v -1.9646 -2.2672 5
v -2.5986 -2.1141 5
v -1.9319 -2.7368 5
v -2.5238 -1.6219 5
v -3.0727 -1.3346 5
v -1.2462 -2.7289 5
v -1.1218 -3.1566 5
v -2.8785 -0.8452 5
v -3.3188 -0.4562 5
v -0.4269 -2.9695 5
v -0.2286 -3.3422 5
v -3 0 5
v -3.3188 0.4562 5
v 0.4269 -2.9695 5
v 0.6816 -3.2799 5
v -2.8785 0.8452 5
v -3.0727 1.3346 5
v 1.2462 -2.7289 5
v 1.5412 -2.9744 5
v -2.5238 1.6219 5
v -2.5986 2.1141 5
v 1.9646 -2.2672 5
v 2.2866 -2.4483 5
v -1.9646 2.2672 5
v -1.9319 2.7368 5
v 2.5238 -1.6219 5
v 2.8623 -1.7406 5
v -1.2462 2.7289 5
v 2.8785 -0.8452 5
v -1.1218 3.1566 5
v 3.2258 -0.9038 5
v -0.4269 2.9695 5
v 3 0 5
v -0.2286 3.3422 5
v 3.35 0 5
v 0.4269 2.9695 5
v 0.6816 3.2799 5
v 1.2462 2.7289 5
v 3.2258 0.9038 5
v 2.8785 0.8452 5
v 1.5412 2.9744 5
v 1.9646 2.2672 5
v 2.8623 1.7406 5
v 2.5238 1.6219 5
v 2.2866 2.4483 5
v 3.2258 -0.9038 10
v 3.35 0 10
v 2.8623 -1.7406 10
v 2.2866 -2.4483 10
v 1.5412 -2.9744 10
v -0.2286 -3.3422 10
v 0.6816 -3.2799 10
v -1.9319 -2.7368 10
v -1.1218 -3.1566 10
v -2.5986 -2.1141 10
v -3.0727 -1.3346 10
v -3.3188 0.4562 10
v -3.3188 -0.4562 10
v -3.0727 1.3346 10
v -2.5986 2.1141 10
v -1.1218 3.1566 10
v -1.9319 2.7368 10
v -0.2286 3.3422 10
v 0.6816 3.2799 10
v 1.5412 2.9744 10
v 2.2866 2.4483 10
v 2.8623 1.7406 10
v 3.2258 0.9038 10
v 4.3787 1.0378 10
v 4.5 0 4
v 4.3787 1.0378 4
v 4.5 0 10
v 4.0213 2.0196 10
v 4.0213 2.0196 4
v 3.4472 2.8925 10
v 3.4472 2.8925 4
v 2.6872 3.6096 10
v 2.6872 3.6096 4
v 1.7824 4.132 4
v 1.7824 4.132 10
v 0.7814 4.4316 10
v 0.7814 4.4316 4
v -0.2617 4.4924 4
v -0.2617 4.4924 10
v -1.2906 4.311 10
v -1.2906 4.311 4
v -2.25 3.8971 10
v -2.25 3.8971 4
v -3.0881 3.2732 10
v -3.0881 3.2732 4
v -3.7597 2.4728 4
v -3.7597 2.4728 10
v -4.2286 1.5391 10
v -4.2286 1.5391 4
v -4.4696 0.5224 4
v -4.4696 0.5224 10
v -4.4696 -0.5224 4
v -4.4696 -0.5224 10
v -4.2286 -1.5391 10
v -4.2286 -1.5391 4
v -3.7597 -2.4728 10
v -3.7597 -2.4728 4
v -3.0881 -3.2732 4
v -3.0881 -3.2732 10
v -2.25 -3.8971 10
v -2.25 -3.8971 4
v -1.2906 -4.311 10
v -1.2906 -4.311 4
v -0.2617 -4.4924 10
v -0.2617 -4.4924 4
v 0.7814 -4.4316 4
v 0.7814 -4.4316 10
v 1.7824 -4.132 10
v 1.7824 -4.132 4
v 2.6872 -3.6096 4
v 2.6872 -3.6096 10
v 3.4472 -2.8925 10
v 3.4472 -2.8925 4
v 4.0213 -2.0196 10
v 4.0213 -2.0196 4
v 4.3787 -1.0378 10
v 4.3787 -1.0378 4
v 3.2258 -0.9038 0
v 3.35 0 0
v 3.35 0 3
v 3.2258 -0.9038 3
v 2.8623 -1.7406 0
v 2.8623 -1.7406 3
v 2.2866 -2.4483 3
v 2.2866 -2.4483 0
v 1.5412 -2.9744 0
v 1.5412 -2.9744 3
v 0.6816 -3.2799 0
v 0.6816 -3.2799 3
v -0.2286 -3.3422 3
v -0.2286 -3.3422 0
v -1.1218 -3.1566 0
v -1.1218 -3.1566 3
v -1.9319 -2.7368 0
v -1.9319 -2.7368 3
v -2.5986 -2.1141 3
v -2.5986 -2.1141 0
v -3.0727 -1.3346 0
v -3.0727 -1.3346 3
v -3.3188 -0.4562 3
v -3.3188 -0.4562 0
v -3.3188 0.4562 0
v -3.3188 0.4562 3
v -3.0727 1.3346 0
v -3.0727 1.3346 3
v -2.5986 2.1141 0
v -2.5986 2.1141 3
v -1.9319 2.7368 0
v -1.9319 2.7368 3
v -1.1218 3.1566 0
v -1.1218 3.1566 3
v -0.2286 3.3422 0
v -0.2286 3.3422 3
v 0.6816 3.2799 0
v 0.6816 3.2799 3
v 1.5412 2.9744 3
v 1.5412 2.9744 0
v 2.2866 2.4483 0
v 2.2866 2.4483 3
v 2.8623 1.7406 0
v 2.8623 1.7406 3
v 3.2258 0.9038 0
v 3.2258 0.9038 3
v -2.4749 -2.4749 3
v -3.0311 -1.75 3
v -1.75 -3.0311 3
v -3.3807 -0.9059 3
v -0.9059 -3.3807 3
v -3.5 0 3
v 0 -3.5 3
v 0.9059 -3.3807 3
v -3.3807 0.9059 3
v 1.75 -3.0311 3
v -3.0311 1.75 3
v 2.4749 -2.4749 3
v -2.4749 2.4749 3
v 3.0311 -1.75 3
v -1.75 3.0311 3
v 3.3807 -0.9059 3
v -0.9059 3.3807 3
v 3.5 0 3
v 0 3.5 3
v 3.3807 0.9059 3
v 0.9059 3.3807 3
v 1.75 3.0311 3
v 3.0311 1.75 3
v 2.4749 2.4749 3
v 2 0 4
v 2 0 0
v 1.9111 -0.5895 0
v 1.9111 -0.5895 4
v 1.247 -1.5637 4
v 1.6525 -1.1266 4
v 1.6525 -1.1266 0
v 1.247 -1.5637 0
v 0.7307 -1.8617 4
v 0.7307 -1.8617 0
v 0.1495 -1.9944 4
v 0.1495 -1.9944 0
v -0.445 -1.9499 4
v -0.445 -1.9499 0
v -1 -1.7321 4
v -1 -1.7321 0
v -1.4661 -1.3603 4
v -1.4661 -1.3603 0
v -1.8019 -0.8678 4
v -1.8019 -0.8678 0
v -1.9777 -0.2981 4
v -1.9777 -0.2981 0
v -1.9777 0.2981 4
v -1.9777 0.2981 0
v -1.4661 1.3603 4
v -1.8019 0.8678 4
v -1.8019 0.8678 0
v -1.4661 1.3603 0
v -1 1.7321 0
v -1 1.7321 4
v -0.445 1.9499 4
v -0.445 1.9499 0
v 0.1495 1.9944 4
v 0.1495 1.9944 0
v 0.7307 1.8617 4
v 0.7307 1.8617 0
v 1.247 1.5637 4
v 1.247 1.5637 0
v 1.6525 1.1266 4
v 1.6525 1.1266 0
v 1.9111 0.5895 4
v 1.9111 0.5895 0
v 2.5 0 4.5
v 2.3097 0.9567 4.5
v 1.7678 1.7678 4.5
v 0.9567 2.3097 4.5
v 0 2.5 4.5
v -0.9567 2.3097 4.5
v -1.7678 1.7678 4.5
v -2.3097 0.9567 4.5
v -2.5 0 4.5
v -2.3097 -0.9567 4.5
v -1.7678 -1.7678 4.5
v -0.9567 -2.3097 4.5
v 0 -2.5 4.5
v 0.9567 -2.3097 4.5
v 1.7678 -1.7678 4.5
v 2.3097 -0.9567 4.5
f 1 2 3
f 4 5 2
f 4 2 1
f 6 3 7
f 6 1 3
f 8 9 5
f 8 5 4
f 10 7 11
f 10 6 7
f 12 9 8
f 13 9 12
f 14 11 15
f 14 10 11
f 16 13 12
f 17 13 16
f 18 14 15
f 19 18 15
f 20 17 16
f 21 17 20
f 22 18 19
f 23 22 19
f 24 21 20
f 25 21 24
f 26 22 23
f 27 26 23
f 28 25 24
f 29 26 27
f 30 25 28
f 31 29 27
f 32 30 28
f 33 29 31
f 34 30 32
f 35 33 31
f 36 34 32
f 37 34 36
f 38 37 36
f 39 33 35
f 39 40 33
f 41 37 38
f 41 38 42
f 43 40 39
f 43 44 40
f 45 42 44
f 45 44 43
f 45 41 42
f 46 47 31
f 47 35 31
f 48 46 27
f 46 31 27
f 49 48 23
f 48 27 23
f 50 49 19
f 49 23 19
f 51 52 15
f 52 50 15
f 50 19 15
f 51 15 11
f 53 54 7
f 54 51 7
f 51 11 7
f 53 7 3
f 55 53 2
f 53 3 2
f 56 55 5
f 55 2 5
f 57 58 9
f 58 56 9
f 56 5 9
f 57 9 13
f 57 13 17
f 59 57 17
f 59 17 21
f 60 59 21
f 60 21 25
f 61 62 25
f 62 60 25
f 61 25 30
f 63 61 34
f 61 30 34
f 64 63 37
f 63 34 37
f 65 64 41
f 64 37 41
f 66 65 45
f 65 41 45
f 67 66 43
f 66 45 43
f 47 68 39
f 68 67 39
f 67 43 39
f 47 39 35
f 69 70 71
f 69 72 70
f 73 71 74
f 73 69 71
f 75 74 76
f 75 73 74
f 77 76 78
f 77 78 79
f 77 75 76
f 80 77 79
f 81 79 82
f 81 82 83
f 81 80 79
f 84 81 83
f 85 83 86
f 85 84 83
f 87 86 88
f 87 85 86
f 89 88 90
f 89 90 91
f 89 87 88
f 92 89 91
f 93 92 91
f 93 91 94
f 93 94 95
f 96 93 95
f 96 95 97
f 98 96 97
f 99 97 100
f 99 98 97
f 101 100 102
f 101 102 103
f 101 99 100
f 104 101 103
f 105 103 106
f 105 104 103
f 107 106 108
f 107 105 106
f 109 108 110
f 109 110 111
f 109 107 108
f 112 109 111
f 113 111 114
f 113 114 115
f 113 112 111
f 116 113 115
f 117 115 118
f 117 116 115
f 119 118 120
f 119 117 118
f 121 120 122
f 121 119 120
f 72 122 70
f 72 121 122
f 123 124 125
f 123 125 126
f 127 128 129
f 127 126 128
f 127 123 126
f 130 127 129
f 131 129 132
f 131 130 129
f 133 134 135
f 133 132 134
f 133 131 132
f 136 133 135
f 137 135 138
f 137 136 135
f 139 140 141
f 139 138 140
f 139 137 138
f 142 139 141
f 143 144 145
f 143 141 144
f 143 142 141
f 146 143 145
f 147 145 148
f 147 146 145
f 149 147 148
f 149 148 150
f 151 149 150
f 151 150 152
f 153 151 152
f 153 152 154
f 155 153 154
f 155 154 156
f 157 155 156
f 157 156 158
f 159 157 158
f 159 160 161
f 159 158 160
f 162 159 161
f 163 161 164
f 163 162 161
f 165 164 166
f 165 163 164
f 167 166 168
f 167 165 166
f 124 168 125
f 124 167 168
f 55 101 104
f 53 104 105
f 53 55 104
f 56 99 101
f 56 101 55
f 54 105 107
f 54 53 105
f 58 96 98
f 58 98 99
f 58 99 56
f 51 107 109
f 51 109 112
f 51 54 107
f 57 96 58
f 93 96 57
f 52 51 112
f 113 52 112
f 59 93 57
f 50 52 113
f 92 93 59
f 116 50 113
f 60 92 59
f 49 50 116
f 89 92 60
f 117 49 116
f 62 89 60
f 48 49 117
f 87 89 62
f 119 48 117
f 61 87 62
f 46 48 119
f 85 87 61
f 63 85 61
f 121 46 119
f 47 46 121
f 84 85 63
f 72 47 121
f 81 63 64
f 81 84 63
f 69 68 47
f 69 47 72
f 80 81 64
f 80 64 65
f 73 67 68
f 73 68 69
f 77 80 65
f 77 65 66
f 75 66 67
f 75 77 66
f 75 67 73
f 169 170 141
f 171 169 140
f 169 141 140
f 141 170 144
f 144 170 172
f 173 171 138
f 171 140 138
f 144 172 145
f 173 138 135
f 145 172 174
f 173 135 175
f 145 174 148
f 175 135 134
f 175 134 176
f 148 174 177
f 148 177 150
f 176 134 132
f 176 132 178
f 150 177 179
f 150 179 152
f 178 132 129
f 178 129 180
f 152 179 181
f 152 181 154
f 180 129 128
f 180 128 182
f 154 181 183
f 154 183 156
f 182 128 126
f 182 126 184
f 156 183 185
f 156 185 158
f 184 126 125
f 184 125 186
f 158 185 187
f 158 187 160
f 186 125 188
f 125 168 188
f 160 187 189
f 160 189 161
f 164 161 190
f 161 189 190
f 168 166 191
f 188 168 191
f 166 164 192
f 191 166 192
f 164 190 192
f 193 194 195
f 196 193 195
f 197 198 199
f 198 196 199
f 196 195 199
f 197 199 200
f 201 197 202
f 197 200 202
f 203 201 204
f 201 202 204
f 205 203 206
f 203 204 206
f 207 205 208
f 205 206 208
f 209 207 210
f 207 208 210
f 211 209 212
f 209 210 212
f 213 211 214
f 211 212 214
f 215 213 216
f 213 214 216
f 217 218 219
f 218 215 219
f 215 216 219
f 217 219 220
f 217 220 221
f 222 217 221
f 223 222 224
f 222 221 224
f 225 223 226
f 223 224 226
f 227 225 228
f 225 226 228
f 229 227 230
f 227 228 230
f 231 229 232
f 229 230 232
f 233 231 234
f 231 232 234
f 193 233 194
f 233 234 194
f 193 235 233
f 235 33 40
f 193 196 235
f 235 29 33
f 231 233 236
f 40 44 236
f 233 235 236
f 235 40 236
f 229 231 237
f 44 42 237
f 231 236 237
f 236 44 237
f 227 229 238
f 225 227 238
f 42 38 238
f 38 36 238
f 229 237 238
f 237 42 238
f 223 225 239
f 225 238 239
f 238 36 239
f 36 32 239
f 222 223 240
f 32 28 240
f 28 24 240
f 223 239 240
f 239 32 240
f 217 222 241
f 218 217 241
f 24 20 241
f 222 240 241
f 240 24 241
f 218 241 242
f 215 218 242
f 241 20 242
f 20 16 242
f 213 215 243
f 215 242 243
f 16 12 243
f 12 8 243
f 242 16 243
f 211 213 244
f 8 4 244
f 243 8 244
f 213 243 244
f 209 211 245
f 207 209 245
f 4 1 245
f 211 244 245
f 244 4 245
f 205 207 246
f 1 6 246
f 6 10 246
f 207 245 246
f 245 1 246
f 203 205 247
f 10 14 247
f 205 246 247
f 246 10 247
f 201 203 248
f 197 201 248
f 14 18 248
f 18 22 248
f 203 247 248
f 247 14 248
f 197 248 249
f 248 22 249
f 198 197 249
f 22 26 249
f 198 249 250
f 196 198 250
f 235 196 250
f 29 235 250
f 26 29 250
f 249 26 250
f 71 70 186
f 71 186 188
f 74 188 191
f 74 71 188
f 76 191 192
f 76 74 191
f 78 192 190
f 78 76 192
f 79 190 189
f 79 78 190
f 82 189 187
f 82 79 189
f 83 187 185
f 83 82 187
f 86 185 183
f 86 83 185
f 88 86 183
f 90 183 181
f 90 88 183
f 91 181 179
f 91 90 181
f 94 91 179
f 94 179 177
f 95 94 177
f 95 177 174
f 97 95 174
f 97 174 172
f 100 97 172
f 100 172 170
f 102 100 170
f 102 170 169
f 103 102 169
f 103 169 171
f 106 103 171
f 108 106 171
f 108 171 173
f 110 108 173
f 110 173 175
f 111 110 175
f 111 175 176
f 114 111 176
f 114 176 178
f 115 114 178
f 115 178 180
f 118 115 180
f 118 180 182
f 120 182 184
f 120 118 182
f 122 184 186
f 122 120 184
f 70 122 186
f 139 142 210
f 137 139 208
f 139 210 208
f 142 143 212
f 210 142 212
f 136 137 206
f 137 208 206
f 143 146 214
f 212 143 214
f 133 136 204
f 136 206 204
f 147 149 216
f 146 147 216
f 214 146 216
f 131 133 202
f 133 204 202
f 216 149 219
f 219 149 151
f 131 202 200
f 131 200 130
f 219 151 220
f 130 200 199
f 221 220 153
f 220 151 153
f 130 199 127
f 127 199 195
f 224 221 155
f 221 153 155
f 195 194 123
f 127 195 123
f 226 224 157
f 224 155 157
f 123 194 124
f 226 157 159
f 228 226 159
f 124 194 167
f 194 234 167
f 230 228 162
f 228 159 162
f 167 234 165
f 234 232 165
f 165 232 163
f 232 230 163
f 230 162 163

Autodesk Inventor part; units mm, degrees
ref_plane "YZ Plane" through (0, 0, 0) normal (1, 0, 0) x (0, 1, 0)
ref_plane "XZ Plane" through (0, 0, 0) normal (0, 1, 0) x (-1, 0, 0)
ref_plane "XY Plane" through (0, 0, 0) normal (0, 0, 1) x (1, 0, 0)
sketch "Sketch1" plane through (0, 0, 0) normal (0, 0, 1) x (1, 0, 0)
  circle A0 centre (0, 0) radius 3.35
  circle A1 centre (0, 0) radius 2
  dimension "d0" = 6.7
  dimension "d1" = 4
extrude "Extrusion1" add sketch "Sketch1" along normal blind 5
sketch "Sketch2" plane through (0, 0, 5) normal (0, 0, 1) x (1, 0, 0)
  circle A0 centre (0, 0) radius 2 projected
  circle A1 centre (0, 0) radius 3.35
  circle A2 centre (0, 0) radius 4.5
  dimension "d4" = 6.7
  dimension "d5" = 9
extrude "Extrusion2" add sketch "Sketch2" along normal blind 5 and the other way blind 2 contours A2
chamfer "Chamfer1" distance 1 angle 45 2 edges at (-4.5, 0, 3) (-2, 0, 5)
properties part number "Matchboxscope_lenstube_v0"
